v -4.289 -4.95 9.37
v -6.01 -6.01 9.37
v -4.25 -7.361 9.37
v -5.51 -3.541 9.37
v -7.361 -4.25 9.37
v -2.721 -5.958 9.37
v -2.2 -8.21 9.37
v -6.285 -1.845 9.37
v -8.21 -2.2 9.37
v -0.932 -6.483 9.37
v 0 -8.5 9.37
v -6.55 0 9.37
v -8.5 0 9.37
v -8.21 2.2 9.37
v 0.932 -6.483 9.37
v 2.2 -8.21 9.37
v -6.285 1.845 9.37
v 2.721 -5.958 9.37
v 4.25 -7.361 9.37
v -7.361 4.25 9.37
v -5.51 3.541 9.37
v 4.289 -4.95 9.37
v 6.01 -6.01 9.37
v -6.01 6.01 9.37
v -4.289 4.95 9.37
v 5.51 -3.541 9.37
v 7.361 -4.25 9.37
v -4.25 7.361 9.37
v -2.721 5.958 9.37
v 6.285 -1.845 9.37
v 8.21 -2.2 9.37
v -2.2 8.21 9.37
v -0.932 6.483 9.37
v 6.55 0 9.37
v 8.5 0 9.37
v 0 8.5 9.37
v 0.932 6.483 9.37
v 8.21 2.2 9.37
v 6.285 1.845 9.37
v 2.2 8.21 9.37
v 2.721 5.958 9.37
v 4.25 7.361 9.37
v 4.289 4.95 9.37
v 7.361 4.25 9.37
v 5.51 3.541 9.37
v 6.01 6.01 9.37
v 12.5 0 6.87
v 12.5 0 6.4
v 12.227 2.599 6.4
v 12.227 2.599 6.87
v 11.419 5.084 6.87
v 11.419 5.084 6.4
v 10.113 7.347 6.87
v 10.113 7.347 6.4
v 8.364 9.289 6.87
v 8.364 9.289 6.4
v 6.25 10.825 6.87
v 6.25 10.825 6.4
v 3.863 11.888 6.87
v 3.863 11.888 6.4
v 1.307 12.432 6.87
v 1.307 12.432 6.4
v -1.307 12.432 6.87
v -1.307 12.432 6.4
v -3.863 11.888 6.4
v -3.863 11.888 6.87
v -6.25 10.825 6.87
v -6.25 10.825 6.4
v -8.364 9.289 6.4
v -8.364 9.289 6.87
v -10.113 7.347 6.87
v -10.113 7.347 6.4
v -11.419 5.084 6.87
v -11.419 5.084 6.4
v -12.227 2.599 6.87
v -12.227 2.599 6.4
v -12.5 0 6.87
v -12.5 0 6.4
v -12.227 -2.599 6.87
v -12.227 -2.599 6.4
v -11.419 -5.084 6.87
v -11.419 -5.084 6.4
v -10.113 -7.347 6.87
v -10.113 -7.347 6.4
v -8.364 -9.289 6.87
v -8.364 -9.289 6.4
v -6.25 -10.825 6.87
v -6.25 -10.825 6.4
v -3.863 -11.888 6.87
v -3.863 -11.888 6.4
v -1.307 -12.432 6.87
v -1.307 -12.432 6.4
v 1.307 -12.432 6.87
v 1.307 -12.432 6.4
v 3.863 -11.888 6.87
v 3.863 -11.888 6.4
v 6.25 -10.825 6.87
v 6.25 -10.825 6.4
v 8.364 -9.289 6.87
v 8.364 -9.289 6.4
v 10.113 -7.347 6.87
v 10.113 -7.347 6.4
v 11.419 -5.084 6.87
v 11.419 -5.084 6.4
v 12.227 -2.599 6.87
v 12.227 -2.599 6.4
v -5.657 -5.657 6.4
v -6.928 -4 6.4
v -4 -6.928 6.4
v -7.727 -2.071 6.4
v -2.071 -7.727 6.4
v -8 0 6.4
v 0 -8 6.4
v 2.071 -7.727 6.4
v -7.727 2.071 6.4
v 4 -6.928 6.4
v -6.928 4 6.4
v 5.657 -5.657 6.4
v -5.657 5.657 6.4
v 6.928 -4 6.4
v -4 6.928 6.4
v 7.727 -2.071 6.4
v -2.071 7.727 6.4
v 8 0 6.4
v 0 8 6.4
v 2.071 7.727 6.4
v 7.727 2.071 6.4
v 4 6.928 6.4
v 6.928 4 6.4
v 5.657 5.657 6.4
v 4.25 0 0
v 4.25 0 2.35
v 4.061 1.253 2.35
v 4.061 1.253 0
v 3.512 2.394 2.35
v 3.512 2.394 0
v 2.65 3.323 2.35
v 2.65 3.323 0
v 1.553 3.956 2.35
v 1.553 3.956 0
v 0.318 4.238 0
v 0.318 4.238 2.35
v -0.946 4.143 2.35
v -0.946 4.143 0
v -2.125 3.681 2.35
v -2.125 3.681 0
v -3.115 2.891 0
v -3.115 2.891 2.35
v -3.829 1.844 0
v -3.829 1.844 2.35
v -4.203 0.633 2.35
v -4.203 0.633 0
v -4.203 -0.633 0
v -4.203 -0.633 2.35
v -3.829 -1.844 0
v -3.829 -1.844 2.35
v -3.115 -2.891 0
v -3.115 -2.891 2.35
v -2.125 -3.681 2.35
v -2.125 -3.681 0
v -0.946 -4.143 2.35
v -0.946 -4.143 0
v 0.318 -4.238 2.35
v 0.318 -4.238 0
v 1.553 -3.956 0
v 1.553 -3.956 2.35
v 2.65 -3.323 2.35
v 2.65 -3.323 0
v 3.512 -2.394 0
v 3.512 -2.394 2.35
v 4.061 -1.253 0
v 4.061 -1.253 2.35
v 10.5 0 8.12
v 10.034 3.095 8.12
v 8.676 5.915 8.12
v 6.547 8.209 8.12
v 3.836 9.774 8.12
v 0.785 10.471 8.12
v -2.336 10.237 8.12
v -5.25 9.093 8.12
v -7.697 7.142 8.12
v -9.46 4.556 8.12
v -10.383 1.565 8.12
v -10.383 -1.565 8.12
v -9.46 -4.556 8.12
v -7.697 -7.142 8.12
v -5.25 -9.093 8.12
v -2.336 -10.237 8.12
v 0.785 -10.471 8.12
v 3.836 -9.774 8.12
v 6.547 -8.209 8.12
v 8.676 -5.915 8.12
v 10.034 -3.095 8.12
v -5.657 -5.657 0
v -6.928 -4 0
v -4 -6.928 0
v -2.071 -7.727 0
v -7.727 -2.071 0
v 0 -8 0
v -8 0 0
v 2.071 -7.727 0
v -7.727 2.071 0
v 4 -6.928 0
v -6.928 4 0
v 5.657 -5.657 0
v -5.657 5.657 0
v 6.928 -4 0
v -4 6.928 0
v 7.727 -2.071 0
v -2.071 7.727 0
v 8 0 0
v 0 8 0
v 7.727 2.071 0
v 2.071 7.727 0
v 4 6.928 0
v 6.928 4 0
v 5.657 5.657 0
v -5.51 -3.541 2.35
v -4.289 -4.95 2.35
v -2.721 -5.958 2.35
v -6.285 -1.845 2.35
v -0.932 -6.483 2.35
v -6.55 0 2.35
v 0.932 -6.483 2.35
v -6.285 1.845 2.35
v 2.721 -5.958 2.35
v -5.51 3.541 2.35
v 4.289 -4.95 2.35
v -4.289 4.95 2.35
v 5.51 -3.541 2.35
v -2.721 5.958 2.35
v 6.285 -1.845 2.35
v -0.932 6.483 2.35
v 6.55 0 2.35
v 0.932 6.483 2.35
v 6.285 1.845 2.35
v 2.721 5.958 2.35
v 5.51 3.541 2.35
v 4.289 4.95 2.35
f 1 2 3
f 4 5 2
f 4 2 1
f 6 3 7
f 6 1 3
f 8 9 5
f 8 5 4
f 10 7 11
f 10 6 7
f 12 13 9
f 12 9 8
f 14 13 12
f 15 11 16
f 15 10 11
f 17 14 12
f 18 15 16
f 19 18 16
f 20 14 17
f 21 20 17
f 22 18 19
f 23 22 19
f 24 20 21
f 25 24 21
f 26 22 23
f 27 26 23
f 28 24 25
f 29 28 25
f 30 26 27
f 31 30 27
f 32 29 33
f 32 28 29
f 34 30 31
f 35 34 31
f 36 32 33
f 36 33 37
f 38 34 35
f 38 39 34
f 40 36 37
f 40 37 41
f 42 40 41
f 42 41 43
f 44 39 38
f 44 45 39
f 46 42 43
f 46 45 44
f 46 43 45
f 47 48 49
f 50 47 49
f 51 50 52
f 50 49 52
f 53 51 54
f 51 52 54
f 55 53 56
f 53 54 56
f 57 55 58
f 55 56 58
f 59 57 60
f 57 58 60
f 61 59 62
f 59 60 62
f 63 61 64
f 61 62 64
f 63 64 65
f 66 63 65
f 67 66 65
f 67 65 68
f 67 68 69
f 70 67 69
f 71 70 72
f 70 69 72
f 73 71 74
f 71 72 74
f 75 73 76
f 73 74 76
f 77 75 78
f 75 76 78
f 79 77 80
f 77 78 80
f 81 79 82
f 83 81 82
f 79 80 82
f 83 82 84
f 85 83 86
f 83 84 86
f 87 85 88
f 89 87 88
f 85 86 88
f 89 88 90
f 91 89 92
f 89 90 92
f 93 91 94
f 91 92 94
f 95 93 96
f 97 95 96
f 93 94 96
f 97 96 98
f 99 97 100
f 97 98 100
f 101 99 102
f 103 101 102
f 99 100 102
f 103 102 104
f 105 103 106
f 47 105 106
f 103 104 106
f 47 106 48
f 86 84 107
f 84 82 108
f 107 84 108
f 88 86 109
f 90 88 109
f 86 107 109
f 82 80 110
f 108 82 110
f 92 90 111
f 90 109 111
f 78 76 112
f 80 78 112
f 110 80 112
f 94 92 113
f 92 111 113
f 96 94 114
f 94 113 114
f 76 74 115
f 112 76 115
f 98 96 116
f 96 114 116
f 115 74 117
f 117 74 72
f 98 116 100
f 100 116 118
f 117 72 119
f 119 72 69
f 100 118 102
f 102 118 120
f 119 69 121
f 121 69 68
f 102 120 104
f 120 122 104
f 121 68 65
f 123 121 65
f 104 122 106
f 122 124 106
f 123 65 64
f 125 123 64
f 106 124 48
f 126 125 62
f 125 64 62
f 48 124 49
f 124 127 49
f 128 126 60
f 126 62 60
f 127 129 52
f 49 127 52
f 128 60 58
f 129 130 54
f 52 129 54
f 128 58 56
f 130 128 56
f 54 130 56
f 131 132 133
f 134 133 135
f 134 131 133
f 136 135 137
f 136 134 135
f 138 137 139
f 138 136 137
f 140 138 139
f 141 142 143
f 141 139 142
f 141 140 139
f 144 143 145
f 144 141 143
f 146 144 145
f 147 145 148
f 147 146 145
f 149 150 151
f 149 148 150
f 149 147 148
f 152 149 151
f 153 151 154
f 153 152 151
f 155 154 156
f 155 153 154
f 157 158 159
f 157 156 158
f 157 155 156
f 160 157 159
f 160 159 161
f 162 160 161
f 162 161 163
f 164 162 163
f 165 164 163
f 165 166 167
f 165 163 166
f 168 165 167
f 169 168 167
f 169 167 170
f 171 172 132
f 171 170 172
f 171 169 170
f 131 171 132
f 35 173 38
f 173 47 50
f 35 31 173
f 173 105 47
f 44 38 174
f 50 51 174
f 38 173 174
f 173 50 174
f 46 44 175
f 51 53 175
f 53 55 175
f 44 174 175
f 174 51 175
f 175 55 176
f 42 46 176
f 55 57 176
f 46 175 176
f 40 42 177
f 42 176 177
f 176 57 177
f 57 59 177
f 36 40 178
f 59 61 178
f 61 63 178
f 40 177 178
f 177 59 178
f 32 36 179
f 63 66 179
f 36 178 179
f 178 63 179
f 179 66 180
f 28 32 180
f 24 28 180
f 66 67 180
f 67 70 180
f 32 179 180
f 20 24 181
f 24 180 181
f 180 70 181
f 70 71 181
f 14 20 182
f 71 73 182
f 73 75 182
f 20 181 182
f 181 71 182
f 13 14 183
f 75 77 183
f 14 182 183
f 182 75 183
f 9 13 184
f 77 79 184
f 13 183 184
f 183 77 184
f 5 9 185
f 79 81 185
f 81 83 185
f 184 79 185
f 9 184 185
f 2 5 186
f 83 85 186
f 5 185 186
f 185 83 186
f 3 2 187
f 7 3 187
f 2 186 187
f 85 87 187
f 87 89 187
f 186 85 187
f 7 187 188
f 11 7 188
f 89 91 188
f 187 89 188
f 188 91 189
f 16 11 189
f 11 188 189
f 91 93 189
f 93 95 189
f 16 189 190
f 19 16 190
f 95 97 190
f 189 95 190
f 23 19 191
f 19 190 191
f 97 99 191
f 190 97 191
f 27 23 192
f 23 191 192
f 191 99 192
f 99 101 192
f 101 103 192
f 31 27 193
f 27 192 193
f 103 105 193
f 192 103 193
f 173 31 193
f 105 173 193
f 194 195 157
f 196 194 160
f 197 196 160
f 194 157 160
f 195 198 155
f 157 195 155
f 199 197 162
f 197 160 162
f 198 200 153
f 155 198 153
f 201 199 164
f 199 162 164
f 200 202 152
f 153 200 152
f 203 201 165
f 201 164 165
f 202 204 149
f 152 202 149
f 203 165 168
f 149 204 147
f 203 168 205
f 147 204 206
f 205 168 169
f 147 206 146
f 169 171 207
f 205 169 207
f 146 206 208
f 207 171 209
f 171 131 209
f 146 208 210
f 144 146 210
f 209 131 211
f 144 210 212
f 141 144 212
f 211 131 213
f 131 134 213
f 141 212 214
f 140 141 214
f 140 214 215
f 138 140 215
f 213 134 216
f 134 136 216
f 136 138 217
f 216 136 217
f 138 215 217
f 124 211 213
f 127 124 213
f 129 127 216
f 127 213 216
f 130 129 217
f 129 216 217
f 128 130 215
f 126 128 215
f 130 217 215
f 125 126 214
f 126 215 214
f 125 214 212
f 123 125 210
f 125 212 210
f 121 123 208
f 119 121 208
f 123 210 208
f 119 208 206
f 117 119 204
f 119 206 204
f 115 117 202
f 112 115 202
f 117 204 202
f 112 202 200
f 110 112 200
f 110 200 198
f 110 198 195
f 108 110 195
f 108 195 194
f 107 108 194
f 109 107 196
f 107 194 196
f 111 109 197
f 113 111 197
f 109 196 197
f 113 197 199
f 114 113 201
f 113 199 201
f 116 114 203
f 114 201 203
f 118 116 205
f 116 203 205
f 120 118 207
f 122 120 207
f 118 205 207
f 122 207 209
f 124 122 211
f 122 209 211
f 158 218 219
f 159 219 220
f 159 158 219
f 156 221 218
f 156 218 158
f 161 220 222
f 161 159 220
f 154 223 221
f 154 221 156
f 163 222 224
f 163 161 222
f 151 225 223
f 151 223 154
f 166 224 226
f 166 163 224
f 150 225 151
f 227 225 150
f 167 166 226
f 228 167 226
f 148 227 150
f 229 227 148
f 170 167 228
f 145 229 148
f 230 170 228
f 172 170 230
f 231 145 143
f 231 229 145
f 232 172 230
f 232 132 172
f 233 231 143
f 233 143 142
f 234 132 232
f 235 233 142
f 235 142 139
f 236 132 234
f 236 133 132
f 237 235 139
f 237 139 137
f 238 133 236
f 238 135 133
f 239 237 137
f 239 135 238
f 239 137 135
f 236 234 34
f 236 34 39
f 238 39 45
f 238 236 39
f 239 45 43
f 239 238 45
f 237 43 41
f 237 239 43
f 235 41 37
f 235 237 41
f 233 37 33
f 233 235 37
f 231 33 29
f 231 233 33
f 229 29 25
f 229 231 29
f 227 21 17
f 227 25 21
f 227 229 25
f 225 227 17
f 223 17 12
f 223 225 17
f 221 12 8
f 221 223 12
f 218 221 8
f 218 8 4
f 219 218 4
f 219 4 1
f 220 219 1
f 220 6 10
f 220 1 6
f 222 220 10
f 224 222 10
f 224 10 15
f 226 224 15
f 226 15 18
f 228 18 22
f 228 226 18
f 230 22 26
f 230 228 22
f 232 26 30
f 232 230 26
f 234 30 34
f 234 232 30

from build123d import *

# Parameters (mm, degrees)
F1_START = 6.4
F0_R     = 12.5
F1_DEPTH = 2.97
F2_R     = 8
F3_DEPTH = 6.4
F4_SIZE2 = 2.5
F4_SIZE  = 4
F5_R     = 4.25
F6_DEPTH = 9.37
F8_START = 2.35
F7_R     = 6.55
F8_DEPTH = 22.65


with BuildPart() as f1:
    # F0 (on Top) → F1 (new body)
    with BuildSketch(Plane.XY.offset(F1_START)):
        Circle(F0_R)
    extrude(amount=F1_DEPTH)

    # F2 (on Top) → F3 (join, through all)
    with BuildSketch(Plane.XY):
        Circle(F2_R)
    extrude(amount=F3_DEPTH)

    # F4
    f4_edges = [f1.edges().sort_by_distance(p)[0] for p in [
        (-12.5, 0, 9.37),
    ]]
    f4_side = f1.faces().sort_by_distance((0, 0, 9.37))[0]
    chamfer(f4_edges, length=F4_SIZE, length2=F4_SIZE2, reference=f4_side)

    # F5 (on Top) → F6 (cut, through all)
    with BuildSketch(Plane.XY):
        Circle(F5_R)
    extrude(amount=F6_DEPTH, mode=Mode.SUBTRACT)

    # F7 (on Top) → F8 (cut)
    with BuildSketch(Plane.XY.offset(F8_START)):
        Circle(F7_R)
    extrude(amount=F8_DEPTH, mode=Mode.SUBTRACT)


solid = f1.part
